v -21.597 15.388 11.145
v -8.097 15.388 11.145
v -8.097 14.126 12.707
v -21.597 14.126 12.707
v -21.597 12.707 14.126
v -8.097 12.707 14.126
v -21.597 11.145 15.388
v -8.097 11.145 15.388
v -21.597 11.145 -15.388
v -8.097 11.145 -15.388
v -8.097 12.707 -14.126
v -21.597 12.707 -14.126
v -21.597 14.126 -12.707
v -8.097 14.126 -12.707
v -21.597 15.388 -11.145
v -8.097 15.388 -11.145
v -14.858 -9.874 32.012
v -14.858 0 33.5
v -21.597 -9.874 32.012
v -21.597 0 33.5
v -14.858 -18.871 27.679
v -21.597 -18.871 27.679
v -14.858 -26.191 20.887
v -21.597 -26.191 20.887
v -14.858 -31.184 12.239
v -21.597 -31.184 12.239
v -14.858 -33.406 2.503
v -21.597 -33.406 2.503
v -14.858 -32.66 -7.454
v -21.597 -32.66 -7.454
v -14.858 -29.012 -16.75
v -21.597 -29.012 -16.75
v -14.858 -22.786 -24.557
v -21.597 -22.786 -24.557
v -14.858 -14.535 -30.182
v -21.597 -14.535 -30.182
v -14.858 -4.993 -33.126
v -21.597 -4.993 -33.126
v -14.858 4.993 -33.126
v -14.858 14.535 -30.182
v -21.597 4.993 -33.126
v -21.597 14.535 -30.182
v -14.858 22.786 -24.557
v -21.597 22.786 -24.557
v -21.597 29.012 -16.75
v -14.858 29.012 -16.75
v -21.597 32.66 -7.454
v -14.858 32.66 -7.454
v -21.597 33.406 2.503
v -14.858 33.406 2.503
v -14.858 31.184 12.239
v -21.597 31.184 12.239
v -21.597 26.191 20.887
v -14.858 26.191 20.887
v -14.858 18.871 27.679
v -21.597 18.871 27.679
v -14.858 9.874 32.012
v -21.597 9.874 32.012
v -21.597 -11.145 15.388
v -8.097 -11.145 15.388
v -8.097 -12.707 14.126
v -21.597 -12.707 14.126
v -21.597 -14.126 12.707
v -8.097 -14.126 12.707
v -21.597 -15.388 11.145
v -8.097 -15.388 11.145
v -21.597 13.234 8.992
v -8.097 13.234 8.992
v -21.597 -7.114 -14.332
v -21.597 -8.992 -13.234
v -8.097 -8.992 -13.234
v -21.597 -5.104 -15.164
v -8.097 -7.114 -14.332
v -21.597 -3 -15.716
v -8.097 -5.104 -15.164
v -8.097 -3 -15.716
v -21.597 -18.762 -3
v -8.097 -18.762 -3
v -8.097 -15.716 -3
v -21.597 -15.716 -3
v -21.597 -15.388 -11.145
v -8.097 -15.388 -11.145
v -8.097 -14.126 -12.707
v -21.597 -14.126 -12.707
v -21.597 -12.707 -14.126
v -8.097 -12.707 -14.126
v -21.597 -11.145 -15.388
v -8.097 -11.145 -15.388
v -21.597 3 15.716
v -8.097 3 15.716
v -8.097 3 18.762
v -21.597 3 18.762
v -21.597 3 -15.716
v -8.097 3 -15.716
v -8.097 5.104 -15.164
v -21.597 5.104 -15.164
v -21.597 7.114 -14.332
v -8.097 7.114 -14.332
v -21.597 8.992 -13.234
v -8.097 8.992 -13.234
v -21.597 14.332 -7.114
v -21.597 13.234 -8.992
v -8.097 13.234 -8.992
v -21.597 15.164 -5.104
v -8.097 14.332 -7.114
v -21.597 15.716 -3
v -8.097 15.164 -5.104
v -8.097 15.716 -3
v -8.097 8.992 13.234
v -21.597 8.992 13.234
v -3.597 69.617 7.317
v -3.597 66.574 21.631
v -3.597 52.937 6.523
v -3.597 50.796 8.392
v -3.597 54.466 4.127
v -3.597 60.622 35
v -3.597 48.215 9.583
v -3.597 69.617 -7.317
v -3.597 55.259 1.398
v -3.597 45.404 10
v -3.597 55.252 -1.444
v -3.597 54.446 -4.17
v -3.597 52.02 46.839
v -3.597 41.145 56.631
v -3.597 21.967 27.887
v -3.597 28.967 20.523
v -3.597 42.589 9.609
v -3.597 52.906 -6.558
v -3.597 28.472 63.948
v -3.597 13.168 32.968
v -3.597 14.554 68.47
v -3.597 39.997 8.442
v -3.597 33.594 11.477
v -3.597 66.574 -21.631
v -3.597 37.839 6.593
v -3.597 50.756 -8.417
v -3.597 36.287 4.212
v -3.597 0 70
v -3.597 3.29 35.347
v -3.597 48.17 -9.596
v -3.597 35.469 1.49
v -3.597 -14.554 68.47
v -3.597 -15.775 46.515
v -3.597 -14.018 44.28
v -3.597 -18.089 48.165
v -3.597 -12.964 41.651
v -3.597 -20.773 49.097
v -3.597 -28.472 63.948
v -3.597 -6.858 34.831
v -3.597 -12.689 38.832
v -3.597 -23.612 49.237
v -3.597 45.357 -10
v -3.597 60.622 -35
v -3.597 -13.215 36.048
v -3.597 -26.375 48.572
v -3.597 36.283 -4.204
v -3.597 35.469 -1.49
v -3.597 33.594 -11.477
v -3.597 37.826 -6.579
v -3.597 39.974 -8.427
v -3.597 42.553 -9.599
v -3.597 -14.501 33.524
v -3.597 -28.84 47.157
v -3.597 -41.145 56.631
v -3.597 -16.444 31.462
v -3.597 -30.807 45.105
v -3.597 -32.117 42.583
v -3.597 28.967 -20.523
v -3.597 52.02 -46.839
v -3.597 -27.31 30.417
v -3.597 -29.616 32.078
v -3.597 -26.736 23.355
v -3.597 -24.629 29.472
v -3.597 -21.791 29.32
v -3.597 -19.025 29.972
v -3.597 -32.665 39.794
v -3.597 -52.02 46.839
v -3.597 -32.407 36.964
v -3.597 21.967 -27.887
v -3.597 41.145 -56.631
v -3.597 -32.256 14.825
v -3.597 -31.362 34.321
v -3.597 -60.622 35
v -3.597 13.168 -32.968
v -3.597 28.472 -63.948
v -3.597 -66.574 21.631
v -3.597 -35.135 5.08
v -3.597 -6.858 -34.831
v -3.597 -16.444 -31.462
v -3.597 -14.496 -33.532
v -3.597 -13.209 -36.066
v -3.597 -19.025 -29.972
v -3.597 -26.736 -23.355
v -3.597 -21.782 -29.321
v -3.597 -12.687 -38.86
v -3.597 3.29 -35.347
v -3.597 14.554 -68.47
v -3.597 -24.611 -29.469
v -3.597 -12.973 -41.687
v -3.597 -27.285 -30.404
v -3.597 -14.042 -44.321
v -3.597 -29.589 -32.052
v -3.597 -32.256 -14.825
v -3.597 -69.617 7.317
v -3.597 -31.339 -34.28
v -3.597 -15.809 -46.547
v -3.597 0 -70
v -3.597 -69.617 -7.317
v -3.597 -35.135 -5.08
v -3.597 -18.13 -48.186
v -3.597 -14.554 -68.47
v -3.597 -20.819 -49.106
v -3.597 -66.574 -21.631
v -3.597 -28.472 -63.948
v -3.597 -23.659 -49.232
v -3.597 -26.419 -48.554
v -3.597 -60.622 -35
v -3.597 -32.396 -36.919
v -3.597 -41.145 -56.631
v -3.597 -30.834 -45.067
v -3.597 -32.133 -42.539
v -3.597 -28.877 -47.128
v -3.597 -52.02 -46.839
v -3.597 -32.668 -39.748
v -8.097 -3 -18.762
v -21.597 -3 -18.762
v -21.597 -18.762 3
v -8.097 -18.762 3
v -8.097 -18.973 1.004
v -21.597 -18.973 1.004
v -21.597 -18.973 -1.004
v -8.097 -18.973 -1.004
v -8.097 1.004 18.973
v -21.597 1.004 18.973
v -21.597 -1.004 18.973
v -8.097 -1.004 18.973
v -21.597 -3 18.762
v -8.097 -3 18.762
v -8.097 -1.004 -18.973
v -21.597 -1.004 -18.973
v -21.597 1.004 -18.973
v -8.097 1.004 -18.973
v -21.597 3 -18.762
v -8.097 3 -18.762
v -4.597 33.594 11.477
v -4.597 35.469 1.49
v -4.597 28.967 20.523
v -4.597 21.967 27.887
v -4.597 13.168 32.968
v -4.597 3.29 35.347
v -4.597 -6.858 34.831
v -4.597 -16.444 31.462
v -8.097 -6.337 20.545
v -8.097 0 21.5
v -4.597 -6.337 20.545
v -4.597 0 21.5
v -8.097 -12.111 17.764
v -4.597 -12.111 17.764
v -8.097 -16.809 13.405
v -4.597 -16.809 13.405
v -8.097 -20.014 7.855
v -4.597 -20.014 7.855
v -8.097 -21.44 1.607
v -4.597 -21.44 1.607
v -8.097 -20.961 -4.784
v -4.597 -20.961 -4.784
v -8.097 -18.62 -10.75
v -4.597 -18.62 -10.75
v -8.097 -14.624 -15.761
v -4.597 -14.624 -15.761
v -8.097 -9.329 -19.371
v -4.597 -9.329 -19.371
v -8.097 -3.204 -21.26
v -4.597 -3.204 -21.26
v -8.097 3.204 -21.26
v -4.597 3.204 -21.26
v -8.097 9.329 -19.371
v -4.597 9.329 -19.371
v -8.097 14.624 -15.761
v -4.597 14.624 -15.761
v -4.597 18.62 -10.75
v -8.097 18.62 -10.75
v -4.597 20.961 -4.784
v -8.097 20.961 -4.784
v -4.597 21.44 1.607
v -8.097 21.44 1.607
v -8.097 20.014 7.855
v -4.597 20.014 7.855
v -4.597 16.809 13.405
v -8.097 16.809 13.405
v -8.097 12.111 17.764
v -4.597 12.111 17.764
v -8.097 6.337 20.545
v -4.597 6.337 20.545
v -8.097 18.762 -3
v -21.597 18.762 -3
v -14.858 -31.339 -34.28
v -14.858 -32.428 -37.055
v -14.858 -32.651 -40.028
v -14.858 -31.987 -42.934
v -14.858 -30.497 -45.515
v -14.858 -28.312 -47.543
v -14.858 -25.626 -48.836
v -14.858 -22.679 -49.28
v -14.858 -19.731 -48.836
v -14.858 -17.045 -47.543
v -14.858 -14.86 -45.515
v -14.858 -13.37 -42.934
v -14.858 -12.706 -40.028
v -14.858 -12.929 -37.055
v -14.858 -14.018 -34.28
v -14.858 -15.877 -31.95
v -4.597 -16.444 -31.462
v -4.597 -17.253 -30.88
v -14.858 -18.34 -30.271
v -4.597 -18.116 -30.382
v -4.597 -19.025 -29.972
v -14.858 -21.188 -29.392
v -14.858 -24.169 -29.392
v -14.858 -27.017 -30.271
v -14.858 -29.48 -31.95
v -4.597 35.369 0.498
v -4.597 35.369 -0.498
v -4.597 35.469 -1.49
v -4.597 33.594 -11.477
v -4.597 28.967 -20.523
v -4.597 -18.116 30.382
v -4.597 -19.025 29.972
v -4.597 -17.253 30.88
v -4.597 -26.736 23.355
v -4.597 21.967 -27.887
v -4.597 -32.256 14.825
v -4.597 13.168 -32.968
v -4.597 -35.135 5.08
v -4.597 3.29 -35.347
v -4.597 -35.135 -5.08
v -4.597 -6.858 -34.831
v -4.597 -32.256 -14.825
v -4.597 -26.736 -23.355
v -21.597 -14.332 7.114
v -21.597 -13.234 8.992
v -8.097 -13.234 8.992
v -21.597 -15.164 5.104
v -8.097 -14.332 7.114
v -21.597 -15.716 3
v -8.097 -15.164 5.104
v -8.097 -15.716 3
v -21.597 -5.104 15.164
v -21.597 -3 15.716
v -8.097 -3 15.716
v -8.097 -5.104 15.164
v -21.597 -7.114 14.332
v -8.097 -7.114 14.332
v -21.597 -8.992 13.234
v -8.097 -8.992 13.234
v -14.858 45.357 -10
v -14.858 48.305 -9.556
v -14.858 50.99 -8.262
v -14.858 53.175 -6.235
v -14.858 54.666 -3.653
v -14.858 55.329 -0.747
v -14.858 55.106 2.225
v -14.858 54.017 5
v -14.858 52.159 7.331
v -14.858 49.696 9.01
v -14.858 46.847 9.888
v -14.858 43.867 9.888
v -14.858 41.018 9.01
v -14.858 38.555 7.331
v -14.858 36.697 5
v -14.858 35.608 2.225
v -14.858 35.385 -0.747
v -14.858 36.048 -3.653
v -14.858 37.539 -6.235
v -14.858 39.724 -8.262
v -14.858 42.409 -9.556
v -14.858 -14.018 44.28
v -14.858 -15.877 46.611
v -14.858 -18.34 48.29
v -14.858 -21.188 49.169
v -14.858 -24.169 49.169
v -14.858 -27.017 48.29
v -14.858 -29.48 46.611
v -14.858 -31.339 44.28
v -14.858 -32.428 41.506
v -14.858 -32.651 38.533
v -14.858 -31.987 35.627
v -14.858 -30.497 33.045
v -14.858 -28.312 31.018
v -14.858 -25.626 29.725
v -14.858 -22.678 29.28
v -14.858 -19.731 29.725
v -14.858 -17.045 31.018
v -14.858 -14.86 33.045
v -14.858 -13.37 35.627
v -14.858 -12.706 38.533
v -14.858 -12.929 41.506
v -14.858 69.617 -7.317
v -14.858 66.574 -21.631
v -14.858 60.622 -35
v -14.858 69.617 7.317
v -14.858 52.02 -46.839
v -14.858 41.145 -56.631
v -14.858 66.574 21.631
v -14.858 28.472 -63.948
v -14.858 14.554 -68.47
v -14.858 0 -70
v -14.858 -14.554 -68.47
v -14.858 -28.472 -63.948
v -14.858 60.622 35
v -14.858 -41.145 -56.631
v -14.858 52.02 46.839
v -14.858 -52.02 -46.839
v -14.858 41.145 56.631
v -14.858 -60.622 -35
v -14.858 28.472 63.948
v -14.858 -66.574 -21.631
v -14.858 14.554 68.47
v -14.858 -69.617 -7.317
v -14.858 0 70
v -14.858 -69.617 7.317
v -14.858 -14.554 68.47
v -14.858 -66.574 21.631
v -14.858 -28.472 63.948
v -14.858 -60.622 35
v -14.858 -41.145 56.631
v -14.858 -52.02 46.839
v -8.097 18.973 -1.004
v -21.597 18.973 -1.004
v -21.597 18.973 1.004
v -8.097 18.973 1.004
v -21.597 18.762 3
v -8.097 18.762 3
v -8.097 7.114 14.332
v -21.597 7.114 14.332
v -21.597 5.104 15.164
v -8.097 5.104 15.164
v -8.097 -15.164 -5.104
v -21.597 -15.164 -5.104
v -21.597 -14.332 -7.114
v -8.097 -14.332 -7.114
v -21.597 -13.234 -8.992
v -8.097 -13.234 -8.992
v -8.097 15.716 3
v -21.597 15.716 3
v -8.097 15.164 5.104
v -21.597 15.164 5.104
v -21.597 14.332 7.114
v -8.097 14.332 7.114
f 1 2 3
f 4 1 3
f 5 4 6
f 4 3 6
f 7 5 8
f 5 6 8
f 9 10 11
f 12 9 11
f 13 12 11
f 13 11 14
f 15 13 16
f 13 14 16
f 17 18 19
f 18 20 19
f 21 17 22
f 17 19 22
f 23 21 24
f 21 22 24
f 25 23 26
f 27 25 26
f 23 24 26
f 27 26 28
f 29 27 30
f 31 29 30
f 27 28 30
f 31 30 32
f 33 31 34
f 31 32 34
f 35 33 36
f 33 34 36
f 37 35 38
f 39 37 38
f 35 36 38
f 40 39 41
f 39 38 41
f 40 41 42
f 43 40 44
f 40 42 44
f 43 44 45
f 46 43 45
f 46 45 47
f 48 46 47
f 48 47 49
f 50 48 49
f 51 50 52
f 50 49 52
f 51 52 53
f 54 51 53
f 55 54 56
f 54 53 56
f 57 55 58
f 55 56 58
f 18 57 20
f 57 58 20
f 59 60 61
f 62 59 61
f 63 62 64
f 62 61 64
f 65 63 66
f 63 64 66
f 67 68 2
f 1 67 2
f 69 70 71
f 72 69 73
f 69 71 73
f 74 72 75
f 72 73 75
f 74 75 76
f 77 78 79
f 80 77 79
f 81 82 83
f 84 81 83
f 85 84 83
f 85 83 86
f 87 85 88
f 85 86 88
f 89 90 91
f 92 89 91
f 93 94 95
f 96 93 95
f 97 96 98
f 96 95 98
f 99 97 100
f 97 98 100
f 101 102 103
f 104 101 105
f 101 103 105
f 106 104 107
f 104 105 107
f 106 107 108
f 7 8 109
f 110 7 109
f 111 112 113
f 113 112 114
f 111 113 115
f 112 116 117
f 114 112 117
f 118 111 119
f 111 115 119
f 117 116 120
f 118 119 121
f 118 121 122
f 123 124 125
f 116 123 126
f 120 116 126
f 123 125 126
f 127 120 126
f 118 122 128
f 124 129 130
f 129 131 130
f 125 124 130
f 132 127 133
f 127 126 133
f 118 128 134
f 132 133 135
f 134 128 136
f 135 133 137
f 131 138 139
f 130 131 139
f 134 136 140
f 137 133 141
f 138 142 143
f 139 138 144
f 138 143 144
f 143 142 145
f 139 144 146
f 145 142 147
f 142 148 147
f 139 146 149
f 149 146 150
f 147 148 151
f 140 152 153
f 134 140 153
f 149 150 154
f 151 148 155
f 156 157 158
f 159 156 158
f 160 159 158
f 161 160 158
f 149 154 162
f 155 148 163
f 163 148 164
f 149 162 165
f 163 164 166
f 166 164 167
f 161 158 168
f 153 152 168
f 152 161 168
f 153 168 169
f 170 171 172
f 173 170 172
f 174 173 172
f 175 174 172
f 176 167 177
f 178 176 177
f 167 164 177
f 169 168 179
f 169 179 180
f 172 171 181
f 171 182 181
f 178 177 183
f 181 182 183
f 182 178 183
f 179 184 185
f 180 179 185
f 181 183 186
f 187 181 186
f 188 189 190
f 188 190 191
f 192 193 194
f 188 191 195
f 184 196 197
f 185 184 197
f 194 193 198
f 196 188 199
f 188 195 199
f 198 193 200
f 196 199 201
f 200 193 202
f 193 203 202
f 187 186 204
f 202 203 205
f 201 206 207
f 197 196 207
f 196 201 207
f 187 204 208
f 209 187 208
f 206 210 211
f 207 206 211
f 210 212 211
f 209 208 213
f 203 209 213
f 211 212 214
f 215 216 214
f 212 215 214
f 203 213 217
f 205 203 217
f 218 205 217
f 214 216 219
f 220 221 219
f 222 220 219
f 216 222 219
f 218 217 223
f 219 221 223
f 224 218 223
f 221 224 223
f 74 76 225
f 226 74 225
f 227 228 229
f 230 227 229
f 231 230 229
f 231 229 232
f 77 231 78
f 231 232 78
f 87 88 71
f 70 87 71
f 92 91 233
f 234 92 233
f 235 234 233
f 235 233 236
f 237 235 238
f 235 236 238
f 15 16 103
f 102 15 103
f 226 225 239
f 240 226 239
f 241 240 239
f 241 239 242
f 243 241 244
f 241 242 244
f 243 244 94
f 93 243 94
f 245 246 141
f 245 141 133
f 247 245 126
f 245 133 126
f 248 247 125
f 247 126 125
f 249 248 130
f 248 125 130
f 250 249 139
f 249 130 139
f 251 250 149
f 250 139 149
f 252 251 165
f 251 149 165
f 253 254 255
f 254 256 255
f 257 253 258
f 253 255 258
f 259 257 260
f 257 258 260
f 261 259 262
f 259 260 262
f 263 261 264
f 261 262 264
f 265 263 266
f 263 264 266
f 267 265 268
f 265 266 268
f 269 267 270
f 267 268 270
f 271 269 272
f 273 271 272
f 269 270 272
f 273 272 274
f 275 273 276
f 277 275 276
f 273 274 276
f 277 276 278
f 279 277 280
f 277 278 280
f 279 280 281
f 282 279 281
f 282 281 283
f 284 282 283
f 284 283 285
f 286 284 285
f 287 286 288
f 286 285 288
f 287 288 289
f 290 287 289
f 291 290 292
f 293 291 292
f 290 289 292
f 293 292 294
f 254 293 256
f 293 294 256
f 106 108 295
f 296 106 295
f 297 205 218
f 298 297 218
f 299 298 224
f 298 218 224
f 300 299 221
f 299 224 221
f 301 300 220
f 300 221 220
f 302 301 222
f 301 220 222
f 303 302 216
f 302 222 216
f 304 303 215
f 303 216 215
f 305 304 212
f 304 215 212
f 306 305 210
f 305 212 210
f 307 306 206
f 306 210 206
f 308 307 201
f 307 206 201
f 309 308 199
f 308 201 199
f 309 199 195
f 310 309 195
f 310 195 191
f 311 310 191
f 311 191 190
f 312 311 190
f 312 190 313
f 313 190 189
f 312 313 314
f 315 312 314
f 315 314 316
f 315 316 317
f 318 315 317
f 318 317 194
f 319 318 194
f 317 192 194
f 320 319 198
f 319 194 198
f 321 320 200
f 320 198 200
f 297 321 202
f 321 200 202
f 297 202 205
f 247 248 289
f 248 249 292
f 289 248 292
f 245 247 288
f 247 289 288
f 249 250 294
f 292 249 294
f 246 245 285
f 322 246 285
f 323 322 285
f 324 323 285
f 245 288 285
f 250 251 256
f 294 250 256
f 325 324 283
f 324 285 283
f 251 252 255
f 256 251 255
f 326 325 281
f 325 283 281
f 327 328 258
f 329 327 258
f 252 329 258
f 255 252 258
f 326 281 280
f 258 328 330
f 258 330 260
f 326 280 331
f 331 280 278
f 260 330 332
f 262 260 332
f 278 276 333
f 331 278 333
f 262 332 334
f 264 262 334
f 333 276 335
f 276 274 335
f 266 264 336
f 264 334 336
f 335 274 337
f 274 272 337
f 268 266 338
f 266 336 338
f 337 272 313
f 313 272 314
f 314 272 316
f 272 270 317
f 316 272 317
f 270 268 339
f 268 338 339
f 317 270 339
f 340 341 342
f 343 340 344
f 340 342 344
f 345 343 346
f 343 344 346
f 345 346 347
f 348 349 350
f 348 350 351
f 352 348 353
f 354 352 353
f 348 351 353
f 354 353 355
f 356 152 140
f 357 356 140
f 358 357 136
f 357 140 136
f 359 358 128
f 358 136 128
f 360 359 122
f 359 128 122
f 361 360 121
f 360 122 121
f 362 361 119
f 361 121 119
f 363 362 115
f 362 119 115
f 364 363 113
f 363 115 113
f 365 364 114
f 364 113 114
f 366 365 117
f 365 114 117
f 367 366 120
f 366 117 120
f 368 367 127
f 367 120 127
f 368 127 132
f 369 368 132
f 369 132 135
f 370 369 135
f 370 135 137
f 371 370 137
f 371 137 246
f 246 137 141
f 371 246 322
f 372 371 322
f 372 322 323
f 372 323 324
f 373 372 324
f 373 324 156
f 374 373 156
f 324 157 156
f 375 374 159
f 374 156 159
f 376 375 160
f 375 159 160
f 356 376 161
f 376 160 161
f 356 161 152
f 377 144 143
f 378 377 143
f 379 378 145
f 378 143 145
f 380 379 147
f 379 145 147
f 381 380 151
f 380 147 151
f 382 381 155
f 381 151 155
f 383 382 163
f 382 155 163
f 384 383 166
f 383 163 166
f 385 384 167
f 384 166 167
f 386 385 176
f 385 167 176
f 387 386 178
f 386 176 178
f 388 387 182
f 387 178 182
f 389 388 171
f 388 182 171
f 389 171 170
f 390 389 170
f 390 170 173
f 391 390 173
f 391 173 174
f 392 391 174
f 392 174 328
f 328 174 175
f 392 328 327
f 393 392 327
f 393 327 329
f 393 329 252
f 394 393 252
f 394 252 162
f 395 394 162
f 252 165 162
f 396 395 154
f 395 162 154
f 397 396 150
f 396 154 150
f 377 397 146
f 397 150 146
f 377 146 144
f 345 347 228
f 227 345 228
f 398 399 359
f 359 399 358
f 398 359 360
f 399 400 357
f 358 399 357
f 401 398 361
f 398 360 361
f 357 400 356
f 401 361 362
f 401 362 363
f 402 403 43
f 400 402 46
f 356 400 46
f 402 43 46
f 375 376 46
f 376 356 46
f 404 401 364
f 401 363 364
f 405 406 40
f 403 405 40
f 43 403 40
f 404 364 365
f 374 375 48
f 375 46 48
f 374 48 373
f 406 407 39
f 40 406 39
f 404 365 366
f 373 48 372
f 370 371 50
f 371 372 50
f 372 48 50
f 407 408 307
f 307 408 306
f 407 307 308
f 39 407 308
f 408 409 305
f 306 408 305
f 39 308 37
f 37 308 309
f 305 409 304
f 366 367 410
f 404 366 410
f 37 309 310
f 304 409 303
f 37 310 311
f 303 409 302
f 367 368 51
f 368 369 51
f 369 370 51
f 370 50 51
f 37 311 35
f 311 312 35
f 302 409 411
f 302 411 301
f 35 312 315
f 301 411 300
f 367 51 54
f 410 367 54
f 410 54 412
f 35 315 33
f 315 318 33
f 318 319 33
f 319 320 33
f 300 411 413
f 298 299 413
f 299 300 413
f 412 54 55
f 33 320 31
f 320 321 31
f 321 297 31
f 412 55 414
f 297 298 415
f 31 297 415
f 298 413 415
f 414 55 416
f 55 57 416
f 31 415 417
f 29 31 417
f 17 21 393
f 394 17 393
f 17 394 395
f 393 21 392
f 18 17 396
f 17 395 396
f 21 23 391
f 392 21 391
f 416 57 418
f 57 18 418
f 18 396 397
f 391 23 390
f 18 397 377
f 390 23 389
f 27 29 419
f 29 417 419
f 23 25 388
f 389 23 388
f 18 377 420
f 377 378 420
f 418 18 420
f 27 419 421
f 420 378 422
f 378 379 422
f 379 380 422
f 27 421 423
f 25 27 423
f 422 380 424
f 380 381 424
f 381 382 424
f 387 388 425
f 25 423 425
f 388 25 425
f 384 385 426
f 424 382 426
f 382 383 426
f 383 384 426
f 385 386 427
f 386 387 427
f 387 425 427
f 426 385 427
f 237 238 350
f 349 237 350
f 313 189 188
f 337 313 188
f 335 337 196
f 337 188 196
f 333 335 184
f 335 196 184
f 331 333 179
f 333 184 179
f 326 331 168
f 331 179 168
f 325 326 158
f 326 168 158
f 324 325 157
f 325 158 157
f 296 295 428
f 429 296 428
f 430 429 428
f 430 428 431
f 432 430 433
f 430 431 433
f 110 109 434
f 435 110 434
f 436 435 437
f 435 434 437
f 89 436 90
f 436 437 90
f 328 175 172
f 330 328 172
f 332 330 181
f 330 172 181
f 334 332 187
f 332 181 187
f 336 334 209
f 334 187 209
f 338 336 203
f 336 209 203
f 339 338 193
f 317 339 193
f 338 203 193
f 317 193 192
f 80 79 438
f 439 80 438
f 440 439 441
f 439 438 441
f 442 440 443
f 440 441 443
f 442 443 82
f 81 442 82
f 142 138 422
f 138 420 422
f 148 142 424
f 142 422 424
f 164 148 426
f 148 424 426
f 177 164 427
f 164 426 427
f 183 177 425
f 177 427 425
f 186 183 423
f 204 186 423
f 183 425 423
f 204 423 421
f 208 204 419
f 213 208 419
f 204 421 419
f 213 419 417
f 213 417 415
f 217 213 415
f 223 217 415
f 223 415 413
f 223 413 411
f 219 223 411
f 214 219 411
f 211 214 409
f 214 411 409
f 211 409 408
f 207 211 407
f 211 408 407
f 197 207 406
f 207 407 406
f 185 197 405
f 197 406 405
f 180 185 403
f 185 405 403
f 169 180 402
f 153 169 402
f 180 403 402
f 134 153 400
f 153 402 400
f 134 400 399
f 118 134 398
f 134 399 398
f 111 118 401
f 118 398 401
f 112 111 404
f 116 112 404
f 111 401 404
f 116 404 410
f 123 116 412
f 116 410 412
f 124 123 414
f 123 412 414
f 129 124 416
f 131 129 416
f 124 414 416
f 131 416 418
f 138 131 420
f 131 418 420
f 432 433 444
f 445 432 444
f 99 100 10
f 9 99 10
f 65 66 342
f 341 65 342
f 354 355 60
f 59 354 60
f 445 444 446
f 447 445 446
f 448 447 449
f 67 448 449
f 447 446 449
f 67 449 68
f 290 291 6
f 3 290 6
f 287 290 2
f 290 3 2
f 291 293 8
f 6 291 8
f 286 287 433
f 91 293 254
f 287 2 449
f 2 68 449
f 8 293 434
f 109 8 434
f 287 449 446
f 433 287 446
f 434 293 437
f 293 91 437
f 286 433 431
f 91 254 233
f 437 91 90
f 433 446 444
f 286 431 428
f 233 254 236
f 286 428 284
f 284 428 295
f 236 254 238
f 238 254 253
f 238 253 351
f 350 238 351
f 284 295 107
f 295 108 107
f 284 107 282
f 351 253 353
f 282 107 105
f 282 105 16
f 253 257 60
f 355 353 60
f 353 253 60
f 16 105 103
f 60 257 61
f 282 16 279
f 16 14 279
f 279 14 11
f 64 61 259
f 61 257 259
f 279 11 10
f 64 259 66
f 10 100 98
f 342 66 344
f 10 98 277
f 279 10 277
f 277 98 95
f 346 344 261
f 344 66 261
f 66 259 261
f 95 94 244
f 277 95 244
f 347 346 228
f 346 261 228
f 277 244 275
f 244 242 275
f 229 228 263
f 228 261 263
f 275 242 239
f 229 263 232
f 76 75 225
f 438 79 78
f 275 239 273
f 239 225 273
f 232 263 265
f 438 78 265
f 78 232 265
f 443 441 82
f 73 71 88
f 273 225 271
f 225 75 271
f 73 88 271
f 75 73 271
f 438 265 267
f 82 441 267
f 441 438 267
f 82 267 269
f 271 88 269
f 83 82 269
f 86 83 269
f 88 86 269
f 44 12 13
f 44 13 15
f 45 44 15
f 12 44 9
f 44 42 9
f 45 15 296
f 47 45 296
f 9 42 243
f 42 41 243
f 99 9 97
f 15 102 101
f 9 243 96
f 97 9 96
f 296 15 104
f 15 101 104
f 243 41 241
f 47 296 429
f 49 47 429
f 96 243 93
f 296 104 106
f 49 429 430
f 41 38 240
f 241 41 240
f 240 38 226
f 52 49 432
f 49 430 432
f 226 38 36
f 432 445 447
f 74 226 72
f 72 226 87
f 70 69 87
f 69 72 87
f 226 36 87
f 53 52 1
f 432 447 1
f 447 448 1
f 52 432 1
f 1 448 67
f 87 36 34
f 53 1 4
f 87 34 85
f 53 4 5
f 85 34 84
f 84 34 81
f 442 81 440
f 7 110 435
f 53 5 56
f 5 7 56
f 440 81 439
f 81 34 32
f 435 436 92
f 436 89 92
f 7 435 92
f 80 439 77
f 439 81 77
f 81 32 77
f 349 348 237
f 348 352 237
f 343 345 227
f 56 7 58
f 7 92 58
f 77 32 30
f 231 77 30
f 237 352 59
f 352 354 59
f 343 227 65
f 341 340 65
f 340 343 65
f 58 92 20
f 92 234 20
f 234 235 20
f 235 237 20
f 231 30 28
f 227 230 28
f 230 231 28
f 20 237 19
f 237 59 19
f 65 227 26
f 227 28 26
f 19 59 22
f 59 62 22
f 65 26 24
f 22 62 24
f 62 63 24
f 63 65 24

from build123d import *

# Parameters (mm, degrees)
SKETCH_2_R               = 10
CUT_EXTRUDE_1_DEPTH      = 102.323474928
PATTERN_CIRCULAR_1_COUNT = 3
CUT_EXTRUDE_2_DEPTH      = 102.323474928
PATTERN_CIRCULAR_2_COUNT = 8


with BuildPart() as part:
    # 草图1 → 旋转1 (revolve)
    with BuildSketch(Plane.XY):
        Polygon((-3.597374179, 35.5), (-3.597374179, 70), (-14.857768053, 70), (-14.857768053, 33.5), (-21.597374179, 33.5), (-21.597374179, 16), (-8.097374179, 16), (-8.097374179, 21.5), (-4.597374179, 21.5), (-4.597374179, 35.5), align=None)
    revolve(axis=Axis((-66.01750547, 0, 0), (1, 0, 0)))

    # 草图2 → 切除-拉伸1 (cut, through all)
    with BuildSketch(Plane(origin=(0, 0, 0), x_dir=(0, 0, -1), z_dir=(1, 0, 0))):
        with Locations((0, 45.357)):
            Circle(SKETCH_2_R)
    cut_extrude_1 = extrude(amount=-CUT_EXTRUDE_1_DEPTH, mode=Mode.SUBTRACT)

    # 阵列(圆周)1: 切除-拉伸1 ×3 about axis
    pattern_circular_1_axis = Axis((-66.01750547, 0, 0), (-1, 0, 0))
    for i in range(1, PATTERN_CIRCULAR_1_COUNT):
        add(cut_extrude_1.rotate(pattern_circular_1_axis, i * 360 / PATTERN_CIRCULAR_1_COUNT), mode=Mode.SUBTRACT)

    # 草图3 → 切除-拉伸2 (cut, through all)
    with BuildSketch(Plane(origin=(0, 0, 0), x_dir=(0, 0, -1), z_dir=(1, 0, 0))):
        with BuildLine():
            Line((3, 15.716233646), (3, 18.761663039))
            ThreePointArc((3, 18.761663039), (0, 19), (-3, 18.761663039))
            Line((-3, 18.761663039), (-3, 15.716233646))
            ThreePointArc((-3, 15.716233646), (0, 16), (3, 15.716233646))
        make_face()
    cut_extrude_2 = extrude(amount=-CUT_EXTRUDE_2_DEPTH, mode=Mode.SUBTRACT)

    # 阵列(圆周)2: 切除-拉伸2 ×8 about axis
    pattern_circular_2_axis = Axis((-66.01750547, 0, 0), (-1, 0, 0))
    for i in range(1, PATTERN_CIRCULAR_2_COUNT):
        add(cut_extrude_2.rotate(pattern_circular_2_axis, i * 360 / PATTERN_CIRCULAR_2_COUNT), mode=Mode.SUBTRACT)


solid = part.part
